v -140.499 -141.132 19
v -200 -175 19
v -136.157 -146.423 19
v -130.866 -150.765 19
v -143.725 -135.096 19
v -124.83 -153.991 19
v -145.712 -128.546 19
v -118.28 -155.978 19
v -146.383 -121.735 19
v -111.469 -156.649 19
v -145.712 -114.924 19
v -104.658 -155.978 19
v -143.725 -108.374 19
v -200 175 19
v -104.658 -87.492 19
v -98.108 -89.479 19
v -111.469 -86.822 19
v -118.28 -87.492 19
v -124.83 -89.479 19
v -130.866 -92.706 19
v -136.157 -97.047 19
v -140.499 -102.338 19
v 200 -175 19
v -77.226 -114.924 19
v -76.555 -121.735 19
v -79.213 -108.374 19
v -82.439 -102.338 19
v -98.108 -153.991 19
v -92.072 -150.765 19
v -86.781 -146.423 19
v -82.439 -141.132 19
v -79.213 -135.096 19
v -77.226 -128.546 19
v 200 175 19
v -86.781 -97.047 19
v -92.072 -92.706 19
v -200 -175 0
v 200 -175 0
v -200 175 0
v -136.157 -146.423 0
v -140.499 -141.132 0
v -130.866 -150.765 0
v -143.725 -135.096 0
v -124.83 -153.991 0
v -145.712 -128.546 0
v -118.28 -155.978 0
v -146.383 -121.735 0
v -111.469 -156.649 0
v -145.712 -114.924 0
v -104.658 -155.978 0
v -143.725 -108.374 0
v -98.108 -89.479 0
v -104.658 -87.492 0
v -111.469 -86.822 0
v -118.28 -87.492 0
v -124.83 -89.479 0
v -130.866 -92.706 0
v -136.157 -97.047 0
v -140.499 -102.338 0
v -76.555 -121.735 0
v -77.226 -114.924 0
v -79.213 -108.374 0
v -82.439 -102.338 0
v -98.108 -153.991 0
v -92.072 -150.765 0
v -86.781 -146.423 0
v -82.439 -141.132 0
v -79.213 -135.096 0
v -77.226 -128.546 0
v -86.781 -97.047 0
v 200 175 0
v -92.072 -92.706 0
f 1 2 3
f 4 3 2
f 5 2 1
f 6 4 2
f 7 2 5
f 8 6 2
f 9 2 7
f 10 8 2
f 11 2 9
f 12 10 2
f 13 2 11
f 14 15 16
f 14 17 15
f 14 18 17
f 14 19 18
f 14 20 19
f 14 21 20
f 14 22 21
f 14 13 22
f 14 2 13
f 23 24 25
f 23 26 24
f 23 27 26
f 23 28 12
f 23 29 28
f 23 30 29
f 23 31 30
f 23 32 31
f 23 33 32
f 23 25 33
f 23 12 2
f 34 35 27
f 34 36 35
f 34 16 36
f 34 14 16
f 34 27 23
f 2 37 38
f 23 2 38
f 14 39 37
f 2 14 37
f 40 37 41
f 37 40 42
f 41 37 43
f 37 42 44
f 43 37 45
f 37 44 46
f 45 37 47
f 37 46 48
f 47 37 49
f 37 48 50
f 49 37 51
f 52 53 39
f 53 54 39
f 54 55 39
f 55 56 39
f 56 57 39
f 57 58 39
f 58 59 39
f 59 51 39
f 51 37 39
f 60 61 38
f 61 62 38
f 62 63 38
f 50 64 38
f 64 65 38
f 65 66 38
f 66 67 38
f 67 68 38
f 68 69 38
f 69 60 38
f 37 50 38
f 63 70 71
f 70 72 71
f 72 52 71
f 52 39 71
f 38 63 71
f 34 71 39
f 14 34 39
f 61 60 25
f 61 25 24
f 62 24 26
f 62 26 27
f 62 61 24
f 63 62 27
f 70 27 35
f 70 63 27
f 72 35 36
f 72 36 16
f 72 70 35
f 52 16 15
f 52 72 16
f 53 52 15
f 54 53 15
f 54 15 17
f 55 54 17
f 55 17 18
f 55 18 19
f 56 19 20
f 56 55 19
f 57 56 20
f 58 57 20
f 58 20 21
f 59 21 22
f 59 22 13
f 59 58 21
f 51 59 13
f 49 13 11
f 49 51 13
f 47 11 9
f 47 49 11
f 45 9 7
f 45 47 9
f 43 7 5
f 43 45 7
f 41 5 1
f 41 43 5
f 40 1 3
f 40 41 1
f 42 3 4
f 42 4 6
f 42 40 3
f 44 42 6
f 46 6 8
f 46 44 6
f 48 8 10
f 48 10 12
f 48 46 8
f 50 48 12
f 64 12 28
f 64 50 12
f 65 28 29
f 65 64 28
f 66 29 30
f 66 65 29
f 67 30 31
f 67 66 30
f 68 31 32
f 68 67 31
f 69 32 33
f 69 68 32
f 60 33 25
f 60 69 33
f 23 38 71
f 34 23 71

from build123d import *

# Parameters (mm, degrees)
F0_R     = 34.9136260122
F1_DEPTH = 19
F2_DEPTH = 543
F3_DEPTH = 543


# Not quite as in the source:
# - an extrude ends at something that could not be found from the text; its depth is read off the source's solid


with BuildPart() as f1:
    # F0 (on Top) → F1 (new body)
    with BuildSketch(Plane.XY):
        with BuildLine():
            Line((200, 110.9662795378), (200, 175))
            Line((200, 175), (141.3804350425, 175))
            add(Edge.make_bspline(
                [(141.3804350425, 175), (156.8649910086, 175), (190.60117535, 168.7984586395), (200, 130.1435418358), (200, 110.9662795378)],
                knots=[0, 0, 0, 0, 0.4762392851, 1, 1, 1, 1], degree=3))
        make_face()
        with BuildLine():
            add(Edge.make_bspline(
                [(141.3804350425, 175), (156.8649910086, 175), (190.60117535, 168.7984586395), (200, 130.1435418358), (200, 110.9662795378)],
                knots=[0, 0, 0, 0, 0.4762392851, 1, 1, 1, 1], degree=3))
            Line((141.3804350425, 175), (-137.7466996101, 175))
            add(Edge.make_bspline(
                [(-200, 108.9276008911), (-200, 127.4557680251), (-189.1867570844, 163.9441482544), (-156.7886150254, 175), (-137.7466996101, 175)],
                knots=[0, 0, 0, 0, 0.5072026371, 1, 1, 1, 1], degree=3))
            Line((-200, 108.9276008911), (-200, -122.5906014442))
            add(Edge.make_bspline(
                [(-147.5979983807, -175), (-157.9488683475, -174.1189344774), (-192.8861581663, -165.8033781762), (-198.1868907749, -133.2250279634), (-200, -122.5906014442)],
                knots=[0, 0, 0, 0, 0.5043810007, 1, 1, 1, 1], degree=3))
            Line((-147.5979983807, -175), (130.1678889743, -175))
            add(Edge.make_bspline(
                [(200, -116.7001660973), (200, -125.782076666), (189.6771600262, -168.0094712369), (144.6769061507, -175), (130.1678889743, -175)],
                knots=[0, 0, 0, 0, 0.4745951866, 1, 1, 1, 1], degree=3))
            Line((200, -116.7001660973), (200, 110.9662795378))
        make_face()
        with Locations((-111.4690546889, -121.7351463744)):
            Circle(F0_R, mode=Mode.SUBTRACT)
        with BuildLine():
            add(Edge.make_bspline(
                [(-200, 108.9276008911), (-200, 127.4557680251), (-189.1867570844, 163.9441482544), (-156.7886150254, 175), (-137.7466996101, 175)],
                knots=[0, 0, 0, 0, 0.5072026371, 1, 1, 1, 1], degree=3))
            Line((-137.7466996101, 175), (-200, 175))
            Line((-200, 175), (-200, 108.9276008911))
        make_face()
        with BuildLine():
            Line((200, -175), (200, -116.7001660973))
            add(Edge.make_bspline(
                [(200, -116.7001660973), (200, -125.782076666), (189.6771600262, -168.0094712369), (144.6769061507, -175), (130.1678889743, -175)],
                knots=[0, 0, 0, 0, 0.4745951866, 1, 1, 1, 1], degree=3))
            Line((130.1678889743, -175), (200, -175))
        make_face()
        with BuildLine():
            add(Edge.make_bspline(
                [(-147.5979983807, -175), (-157.9488683475, -174.1189344774), (-192.8861581663, -165.8033781762), (-198.1868907749, -133.2250279634), (-200, -122.5906014442)],
                knots=[0, 0, 0, 0, 0.5043810007, 1, 1, 1, 1], degree=3))
            Line((-200, -122.5906014442), (-200, -175))
            Line((-200, -175), (-147.5979983807, -175))
        make_face()
    extrude(amount=F1_DEPTH)

    # F0 (on Top) → F2 (cut, through all)
    with BuildSketch(Plane.XY):
        with Locations((-111.4690546889, -121.7351463744)):
            Circle(F0_R)
    extrude(amount=-F2_DEPTH, mode=Mode.SUBTRACT)

    # F0 (on Top) → F3 (cut, through all)
    with BuildSketch(Plane.XY):
        with BuildLine():
            add(Edge.make_bspline(
                [(-147.5979983807, -175), (-157.9488683475, -174.1189344774), (-192.8861581663, -165.8033781762), (-198.1868907749, -133.2250279634), (-200, -122.5906014442)],
                knots=[0, 0, 0, 0, 0.5043810007, 1, 1, 1, 1], degree=3))
            Line((-200, -122.5906014442), (-200, -175))
            Line((-200, -175), (-147.5979983807, -175))
        make_face()
    extrude(amount=-F3_DEPTH, mode=Mode.SUBTRACT)


solid = f1.part
